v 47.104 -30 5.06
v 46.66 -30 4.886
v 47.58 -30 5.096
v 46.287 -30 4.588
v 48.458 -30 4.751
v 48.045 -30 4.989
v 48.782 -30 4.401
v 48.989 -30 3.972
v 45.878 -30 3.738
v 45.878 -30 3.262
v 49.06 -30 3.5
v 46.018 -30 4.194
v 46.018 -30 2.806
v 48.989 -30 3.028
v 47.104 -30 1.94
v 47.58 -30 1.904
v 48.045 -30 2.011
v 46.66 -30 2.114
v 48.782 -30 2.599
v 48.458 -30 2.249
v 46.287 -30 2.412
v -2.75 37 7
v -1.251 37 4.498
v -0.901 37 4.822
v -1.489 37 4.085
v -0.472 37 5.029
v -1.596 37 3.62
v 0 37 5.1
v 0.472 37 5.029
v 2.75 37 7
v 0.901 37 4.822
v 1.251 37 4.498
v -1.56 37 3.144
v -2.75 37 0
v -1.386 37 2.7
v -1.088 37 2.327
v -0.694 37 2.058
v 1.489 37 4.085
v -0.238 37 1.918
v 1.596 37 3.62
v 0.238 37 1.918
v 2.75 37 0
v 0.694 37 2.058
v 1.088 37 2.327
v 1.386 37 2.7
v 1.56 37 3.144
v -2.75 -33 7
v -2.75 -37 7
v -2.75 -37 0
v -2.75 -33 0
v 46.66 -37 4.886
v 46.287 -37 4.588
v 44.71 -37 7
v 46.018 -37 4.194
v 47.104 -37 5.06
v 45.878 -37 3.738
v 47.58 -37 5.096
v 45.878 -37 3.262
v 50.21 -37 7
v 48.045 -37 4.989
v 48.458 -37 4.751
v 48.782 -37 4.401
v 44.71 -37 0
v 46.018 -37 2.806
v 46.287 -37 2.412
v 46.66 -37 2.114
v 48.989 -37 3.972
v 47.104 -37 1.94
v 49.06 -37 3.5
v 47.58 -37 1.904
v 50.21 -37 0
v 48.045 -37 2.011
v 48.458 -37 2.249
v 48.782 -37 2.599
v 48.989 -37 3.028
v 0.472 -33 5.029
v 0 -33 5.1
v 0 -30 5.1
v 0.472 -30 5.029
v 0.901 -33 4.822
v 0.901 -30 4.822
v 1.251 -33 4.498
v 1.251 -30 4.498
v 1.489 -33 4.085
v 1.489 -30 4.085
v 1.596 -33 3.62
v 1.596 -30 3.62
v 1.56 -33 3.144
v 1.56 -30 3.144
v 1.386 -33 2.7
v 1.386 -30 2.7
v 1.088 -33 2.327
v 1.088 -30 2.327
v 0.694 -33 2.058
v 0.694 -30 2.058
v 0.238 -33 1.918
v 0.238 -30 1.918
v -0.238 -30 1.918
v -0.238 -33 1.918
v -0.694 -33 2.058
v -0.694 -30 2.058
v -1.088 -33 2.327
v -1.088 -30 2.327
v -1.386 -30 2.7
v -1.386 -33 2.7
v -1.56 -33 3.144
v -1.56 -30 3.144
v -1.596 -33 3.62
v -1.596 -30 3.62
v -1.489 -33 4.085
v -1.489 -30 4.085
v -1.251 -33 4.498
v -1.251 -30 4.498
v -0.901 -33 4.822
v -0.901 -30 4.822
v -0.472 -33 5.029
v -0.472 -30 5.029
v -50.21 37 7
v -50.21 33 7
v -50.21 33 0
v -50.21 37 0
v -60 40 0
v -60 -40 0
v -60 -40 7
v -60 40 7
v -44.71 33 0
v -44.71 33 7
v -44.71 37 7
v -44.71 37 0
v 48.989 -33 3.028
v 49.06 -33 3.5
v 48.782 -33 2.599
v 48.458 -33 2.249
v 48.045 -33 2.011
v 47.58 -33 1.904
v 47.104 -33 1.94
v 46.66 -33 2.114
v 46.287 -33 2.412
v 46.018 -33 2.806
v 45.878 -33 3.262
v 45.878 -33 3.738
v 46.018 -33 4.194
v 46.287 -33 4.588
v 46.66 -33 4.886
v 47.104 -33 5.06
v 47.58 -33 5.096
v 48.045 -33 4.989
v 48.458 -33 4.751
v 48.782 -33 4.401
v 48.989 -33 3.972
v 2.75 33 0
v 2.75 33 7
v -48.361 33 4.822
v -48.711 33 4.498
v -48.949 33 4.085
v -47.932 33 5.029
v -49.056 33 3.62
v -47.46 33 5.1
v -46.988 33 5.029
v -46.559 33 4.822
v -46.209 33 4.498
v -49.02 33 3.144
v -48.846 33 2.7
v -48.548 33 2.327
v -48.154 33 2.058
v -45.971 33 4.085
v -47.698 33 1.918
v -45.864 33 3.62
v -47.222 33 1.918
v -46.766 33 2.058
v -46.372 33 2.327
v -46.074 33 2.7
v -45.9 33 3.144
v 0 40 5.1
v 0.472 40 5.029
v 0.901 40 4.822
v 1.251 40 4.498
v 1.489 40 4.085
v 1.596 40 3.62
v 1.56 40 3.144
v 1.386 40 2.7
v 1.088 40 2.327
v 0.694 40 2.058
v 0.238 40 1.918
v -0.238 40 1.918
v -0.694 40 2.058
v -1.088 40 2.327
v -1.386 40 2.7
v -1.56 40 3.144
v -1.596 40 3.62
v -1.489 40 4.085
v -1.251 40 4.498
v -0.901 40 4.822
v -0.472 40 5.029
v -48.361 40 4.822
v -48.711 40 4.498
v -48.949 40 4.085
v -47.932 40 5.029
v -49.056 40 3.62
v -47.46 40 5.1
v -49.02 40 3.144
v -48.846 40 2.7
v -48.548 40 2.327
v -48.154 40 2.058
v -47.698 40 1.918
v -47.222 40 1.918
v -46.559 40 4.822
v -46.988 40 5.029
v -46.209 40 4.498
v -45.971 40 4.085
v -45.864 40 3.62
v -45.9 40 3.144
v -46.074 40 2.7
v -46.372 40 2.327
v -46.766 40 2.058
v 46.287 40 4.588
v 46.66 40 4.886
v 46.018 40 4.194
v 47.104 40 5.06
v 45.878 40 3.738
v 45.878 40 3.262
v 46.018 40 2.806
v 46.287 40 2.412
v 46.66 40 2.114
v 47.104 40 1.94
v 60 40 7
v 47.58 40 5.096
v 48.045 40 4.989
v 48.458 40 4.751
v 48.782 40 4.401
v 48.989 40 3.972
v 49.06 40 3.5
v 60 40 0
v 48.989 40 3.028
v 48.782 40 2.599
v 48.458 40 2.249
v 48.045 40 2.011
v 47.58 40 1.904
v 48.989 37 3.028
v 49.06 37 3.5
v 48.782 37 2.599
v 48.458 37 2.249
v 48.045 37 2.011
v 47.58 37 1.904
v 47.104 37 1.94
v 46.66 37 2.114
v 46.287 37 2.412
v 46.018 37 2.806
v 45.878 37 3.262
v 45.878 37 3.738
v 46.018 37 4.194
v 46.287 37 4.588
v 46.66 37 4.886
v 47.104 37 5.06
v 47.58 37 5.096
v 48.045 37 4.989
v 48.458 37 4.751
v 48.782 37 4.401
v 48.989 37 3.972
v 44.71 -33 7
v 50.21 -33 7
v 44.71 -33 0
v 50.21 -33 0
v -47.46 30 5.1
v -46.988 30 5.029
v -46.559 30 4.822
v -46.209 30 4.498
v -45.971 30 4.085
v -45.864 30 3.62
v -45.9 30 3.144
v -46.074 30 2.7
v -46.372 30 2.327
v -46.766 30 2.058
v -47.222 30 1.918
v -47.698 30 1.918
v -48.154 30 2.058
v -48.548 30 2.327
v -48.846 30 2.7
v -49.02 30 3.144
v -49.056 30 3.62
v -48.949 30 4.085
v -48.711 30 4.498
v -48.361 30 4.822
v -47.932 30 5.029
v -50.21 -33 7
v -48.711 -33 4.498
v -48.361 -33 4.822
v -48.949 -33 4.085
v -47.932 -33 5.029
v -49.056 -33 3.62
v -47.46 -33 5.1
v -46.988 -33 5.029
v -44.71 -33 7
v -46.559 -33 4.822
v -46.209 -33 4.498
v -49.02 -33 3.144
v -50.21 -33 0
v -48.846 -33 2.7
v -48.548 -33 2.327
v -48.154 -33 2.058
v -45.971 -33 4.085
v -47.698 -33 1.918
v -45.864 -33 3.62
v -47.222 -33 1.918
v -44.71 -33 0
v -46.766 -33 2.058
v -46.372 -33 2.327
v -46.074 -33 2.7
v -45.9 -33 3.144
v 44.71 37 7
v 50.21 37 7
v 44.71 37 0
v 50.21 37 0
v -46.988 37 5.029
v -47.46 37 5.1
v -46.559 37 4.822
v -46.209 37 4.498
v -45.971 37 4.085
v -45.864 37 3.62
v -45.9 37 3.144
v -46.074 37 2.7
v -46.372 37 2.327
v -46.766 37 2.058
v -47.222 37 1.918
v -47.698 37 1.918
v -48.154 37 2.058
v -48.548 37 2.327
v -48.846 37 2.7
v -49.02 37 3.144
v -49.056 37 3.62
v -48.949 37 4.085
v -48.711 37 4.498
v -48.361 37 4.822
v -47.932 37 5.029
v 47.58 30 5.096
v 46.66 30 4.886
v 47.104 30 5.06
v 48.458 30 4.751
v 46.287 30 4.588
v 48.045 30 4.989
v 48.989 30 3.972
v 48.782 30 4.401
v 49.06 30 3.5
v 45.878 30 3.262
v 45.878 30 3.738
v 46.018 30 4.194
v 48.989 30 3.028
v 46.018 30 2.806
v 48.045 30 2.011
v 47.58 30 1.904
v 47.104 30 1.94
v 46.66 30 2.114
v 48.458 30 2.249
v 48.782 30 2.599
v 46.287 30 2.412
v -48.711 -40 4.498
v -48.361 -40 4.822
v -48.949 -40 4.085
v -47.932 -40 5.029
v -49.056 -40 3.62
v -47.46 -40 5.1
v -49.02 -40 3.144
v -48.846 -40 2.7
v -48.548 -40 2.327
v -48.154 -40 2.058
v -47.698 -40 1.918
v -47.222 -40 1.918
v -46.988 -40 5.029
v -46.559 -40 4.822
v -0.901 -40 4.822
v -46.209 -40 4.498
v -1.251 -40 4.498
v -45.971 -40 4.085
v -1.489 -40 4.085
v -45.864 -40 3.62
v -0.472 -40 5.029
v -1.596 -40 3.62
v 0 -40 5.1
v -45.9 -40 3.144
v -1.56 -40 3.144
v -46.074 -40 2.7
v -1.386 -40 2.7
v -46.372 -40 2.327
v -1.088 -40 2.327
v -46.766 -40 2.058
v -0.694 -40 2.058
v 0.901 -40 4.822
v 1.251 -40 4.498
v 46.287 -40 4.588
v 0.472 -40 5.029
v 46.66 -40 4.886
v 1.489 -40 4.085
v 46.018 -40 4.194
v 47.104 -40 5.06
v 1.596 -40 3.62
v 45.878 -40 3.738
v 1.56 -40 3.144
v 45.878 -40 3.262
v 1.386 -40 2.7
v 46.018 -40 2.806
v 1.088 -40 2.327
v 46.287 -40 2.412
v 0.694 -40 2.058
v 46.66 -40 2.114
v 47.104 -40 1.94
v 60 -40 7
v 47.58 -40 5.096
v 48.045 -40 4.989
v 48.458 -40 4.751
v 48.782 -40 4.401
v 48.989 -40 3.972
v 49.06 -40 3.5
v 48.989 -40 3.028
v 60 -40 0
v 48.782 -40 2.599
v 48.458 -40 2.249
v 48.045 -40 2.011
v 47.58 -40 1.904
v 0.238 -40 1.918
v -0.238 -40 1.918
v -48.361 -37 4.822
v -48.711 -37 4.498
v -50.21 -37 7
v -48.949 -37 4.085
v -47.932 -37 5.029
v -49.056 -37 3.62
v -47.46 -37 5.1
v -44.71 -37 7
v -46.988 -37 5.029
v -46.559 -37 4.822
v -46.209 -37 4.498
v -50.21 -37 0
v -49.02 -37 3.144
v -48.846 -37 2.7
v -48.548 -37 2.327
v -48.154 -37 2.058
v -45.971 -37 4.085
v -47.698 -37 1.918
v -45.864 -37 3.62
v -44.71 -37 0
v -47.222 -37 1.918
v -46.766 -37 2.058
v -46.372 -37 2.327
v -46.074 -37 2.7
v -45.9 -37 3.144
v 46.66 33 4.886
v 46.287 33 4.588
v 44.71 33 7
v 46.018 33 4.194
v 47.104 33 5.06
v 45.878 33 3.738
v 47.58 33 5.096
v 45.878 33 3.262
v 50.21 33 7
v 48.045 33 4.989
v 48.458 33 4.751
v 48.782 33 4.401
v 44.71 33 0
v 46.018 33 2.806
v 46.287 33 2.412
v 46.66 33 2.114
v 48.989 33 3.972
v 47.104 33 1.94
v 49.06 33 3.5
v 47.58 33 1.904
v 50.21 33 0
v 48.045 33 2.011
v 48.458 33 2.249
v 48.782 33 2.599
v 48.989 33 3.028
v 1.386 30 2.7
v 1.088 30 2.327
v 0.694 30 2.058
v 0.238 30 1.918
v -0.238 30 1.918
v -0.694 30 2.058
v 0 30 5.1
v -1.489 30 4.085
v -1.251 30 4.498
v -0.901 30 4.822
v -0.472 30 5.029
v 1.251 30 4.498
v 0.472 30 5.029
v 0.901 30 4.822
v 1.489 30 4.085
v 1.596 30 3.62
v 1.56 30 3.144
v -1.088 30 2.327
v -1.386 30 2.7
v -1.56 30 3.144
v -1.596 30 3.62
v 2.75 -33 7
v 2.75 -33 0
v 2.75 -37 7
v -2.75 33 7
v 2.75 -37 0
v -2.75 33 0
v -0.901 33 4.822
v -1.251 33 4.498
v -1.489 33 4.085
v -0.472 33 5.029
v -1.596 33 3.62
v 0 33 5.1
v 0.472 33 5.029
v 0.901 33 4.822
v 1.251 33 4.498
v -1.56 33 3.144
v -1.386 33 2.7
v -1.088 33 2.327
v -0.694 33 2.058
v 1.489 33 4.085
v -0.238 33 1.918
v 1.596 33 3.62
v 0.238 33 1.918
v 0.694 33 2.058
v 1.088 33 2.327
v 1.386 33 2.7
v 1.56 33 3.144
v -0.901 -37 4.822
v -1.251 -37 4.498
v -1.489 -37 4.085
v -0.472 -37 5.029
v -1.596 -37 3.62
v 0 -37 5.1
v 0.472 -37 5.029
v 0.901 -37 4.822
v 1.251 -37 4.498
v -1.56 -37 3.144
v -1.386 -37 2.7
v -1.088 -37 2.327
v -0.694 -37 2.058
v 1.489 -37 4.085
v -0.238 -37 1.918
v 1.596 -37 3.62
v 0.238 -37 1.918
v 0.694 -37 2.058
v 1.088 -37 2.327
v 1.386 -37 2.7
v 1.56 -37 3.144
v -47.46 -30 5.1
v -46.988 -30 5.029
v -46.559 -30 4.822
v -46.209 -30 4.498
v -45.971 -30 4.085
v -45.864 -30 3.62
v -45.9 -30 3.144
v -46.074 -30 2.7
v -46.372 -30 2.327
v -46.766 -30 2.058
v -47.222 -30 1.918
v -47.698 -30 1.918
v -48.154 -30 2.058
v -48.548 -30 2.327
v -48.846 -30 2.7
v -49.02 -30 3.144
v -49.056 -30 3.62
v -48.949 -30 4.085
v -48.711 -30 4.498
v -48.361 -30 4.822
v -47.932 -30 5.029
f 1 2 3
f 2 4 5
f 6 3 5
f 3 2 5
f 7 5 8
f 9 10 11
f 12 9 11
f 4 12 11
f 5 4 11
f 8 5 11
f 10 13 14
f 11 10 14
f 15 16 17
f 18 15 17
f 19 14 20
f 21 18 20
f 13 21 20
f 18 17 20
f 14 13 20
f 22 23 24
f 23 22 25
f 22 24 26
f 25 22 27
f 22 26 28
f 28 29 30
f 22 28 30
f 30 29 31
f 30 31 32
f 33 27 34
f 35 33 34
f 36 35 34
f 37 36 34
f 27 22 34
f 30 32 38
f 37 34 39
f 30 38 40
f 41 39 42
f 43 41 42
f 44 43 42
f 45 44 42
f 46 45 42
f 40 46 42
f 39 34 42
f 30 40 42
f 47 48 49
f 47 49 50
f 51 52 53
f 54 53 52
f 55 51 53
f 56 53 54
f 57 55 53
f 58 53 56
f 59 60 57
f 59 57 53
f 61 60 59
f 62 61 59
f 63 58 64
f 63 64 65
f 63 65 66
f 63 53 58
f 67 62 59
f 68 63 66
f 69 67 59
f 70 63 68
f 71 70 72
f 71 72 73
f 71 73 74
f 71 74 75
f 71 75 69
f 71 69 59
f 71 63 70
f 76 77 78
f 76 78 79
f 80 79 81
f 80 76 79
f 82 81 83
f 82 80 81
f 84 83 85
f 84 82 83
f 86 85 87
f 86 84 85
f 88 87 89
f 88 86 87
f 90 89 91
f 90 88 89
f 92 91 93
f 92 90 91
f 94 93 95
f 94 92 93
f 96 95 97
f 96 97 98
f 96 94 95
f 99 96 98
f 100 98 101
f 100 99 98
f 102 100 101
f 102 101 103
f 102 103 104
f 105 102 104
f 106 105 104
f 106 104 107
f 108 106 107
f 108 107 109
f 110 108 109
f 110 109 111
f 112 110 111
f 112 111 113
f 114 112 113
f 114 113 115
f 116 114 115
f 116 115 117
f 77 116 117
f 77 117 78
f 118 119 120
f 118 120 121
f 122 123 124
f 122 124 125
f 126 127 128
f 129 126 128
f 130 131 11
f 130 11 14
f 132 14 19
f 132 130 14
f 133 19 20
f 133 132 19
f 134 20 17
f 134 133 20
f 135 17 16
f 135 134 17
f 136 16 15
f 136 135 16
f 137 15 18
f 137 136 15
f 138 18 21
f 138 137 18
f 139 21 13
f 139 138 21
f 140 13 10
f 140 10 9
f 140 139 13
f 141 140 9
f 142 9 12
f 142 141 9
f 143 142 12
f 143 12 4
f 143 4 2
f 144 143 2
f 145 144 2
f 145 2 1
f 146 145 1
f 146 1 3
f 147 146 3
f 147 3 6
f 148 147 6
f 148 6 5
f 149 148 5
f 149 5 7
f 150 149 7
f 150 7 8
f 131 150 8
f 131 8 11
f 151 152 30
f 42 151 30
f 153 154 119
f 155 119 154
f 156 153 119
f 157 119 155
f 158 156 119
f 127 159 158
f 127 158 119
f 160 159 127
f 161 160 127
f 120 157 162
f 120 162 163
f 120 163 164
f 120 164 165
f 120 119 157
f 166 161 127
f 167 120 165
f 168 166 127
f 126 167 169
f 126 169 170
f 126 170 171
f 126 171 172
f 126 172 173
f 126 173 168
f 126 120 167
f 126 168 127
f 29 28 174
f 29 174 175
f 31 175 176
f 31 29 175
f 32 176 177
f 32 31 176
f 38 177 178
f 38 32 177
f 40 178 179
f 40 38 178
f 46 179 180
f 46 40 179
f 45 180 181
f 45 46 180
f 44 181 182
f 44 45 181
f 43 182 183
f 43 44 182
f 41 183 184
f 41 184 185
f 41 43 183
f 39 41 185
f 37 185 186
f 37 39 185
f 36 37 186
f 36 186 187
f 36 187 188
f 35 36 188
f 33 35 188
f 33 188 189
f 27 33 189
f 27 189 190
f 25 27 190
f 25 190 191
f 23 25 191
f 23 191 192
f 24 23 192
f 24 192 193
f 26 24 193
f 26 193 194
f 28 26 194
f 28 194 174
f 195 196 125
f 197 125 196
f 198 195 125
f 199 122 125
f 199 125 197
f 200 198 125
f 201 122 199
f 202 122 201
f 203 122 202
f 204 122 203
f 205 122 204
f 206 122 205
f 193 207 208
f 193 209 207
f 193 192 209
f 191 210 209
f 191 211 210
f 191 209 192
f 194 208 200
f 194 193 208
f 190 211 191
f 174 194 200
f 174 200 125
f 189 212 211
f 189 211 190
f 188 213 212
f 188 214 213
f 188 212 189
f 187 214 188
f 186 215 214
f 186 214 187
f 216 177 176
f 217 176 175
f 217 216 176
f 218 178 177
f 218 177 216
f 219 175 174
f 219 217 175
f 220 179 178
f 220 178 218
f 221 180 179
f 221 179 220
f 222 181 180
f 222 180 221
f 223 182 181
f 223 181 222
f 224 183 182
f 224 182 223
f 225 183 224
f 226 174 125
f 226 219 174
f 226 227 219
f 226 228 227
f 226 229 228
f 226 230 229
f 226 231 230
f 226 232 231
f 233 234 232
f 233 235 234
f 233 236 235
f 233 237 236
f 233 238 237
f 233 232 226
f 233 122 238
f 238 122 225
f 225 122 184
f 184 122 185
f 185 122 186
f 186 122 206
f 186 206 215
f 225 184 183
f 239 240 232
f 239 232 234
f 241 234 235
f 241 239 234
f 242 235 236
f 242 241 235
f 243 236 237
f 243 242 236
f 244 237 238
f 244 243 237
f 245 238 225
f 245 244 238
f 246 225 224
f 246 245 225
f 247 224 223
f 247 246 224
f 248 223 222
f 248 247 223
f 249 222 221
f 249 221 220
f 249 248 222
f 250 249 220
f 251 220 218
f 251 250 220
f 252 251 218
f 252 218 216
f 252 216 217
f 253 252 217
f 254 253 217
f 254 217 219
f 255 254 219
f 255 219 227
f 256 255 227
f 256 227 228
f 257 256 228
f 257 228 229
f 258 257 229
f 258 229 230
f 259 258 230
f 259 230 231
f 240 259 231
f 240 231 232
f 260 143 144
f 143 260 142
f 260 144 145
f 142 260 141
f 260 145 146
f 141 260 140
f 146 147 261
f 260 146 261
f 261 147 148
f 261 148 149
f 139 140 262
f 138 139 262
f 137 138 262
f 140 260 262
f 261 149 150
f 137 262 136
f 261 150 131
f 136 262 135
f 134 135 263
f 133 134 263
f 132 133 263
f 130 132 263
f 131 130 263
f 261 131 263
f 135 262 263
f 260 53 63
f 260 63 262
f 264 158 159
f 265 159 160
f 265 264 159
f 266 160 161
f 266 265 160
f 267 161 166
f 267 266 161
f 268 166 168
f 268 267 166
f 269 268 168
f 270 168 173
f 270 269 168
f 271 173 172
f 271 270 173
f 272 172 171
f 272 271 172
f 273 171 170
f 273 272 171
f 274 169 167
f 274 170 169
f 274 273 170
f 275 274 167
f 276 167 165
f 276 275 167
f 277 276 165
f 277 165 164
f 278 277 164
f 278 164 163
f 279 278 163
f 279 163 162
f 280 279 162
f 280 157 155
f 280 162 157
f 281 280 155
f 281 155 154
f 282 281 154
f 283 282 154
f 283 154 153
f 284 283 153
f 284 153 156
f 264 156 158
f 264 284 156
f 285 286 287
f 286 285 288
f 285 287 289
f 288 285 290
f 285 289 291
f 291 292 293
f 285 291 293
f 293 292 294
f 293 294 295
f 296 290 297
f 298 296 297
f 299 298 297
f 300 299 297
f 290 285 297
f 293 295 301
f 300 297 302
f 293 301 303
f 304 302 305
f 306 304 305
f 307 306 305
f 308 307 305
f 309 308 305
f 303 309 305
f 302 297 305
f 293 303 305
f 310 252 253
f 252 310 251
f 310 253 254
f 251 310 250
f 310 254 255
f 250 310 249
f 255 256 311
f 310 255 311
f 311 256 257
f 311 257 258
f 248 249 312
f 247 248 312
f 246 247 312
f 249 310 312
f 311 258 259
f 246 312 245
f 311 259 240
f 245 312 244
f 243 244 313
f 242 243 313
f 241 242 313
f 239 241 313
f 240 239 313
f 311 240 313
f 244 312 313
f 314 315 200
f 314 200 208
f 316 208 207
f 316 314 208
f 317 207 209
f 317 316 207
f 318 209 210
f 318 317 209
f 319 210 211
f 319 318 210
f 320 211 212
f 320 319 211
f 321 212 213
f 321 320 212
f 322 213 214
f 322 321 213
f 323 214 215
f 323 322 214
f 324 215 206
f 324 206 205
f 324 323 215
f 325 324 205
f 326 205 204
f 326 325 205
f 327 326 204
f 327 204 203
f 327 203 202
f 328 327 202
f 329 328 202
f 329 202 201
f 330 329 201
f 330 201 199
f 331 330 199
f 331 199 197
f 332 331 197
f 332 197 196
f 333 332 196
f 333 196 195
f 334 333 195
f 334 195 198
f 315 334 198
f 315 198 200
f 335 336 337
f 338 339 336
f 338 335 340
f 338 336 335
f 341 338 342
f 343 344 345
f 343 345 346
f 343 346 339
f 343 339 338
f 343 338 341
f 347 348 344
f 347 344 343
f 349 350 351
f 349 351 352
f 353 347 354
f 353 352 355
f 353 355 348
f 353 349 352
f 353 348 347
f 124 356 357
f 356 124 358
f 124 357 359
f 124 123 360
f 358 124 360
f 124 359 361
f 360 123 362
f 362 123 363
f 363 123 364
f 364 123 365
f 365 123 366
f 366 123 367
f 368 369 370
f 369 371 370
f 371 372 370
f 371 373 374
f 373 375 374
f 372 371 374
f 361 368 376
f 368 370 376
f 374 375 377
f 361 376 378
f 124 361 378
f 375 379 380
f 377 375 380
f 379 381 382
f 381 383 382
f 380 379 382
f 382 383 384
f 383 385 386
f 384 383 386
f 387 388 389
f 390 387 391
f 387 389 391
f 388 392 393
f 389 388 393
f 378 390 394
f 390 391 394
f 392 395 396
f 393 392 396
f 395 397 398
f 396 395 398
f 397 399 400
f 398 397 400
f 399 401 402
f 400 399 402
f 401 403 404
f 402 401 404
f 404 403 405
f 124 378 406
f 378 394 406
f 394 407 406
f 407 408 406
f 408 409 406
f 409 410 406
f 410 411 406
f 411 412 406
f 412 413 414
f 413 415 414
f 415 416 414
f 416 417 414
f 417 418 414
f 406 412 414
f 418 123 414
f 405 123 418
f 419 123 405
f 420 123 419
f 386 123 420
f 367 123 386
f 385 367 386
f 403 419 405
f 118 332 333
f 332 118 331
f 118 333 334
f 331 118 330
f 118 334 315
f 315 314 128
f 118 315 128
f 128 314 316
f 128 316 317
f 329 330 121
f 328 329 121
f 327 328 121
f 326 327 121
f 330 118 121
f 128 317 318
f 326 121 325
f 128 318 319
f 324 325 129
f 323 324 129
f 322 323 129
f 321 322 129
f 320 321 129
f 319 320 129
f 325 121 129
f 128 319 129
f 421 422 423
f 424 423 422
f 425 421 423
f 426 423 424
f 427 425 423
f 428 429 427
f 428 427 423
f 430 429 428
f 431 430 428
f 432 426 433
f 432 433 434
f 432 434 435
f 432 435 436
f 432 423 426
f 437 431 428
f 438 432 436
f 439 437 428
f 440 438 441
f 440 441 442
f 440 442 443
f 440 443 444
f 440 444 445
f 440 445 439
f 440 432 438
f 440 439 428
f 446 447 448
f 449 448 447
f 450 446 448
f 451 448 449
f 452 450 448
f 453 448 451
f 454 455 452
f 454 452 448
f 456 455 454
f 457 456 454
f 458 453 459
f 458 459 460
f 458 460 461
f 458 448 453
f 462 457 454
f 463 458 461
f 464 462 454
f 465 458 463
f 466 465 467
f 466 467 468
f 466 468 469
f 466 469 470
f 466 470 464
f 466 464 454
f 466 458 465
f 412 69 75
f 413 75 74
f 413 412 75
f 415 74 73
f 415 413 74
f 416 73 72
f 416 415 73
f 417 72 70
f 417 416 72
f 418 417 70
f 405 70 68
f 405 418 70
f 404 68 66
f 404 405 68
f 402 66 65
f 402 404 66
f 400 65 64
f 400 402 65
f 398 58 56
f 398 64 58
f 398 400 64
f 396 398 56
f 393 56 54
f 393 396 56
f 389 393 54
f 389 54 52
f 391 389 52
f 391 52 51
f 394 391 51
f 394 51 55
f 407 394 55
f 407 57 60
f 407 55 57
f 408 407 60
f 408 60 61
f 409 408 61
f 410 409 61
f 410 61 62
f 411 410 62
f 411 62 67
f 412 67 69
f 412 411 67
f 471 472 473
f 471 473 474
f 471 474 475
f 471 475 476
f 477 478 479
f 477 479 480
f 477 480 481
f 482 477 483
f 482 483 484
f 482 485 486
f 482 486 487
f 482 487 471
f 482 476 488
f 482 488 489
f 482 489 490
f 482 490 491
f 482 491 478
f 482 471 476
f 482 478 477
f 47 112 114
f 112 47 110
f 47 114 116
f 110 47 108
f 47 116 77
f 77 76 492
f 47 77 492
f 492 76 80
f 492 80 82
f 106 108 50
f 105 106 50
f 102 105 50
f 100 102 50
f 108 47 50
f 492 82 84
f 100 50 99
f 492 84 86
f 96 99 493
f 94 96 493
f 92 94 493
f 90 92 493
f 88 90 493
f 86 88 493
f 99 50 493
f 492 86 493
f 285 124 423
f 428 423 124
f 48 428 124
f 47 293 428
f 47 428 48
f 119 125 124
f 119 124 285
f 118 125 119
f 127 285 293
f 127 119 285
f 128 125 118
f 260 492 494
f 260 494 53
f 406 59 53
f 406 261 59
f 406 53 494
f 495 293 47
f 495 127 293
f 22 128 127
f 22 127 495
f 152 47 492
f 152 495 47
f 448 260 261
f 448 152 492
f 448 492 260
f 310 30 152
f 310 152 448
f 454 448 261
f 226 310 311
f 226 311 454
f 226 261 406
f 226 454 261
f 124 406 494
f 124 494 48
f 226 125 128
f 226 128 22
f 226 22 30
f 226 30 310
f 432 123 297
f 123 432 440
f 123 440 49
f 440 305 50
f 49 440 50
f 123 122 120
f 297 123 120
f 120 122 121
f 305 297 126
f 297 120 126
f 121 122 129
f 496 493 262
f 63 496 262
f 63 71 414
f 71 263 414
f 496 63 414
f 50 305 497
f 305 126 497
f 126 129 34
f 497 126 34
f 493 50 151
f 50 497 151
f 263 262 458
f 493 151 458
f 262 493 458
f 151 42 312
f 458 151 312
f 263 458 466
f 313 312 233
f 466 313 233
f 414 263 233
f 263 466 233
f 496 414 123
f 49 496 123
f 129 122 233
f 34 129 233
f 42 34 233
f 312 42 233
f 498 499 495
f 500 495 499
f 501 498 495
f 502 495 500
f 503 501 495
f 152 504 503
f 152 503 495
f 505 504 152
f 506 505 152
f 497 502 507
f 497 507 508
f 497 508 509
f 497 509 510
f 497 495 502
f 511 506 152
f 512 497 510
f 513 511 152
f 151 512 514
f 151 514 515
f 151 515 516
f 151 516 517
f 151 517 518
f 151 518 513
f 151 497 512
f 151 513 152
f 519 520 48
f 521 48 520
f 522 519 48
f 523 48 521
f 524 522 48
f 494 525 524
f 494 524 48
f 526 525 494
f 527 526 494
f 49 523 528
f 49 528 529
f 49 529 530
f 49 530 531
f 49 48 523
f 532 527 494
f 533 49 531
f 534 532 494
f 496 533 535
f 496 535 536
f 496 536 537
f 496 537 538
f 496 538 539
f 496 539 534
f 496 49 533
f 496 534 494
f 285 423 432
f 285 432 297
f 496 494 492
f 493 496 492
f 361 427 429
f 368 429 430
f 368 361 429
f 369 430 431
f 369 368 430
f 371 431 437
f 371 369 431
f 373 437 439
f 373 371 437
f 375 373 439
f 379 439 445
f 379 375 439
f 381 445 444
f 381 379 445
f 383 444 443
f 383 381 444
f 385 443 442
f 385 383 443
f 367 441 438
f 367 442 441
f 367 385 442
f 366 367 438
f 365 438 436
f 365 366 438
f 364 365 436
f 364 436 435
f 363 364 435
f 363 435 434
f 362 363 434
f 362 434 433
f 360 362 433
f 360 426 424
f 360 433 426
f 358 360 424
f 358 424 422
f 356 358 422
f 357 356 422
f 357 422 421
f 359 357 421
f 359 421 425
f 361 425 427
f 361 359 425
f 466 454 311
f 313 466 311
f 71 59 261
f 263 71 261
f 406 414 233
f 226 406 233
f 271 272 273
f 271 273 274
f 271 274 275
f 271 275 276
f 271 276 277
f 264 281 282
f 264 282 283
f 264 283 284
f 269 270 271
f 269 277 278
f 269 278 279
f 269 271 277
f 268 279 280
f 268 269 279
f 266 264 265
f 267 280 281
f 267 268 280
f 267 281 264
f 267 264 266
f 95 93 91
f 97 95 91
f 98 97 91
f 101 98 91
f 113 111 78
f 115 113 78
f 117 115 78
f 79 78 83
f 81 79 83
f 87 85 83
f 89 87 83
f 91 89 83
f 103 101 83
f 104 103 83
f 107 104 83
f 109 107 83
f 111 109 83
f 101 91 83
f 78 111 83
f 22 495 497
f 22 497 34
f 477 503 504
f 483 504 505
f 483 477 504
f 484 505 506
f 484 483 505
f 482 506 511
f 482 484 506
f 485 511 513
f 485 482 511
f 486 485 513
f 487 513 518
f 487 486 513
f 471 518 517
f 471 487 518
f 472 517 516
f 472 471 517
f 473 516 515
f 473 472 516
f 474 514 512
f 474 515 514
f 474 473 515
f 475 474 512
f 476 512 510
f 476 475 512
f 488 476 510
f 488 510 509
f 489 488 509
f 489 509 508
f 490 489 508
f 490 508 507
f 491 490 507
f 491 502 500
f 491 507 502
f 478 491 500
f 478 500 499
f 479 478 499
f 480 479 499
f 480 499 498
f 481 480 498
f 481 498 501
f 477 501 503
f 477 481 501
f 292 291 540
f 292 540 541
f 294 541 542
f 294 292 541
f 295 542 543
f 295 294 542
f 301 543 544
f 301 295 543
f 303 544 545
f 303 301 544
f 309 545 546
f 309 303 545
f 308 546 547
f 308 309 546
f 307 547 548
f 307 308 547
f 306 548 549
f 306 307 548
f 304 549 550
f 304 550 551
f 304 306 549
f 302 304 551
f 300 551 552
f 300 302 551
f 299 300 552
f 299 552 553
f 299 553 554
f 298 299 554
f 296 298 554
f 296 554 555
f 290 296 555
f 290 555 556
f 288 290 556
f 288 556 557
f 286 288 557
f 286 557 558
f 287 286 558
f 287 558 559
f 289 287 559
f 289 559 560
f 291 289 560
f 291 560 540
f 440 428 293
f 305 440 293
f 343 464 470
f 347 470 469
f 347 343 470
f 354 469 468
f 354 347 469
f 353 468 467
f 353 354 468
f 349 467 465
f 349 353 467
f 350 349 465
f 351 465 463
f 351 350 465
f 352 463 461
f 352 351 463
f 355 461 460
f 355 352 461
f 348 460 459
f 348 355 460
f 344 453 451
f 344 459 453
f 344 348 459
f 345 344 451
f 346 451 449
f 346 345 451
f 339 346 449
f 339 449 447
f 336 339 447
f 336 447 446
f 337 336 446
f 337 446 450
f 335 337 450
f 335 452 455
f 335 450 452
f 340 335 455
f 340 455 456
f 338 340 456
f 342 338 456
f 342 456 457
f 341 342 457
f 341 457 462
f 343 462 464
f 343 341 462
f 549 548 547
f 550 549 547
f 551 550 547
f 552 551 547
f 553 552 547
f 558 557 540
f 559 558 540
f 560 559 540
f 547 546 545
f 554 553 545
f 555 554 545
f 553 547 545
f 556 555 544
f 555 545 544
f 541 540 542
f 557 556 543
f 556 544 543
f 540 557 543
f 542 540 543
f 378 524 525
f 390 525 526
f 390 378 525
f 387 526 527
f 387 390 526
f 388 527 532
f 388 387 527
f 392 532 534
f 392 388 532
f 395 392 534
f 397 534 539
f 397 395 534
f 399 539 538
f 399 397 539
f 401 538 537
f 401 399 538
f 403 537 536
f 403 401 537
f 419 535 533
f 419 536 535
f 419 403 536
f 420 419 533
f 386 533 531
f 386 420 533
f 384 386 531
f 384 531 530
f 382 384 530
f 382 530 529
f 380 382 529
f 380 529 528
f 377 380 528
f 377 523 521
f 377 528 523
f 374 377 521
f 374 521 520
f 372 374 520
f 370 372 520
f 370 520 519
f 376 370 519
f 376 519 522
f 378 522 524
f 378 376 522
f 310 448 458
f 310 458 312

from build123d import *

# Parameters (mm, degrees)
ESBO_O1_W                = 120
ESBO_O1_H                = 80
ESBO_O1_W_2              = 5.5
ESBO_O1_H_2              = 4
RESSALTO_EXTRUS_O4_DEPTH = 7
CORTE_EXTRUS_O1_START    = -80
ESBO_O2_R                = 1.6
CORTE_EXTRUS_O1_DEPTH    = 10
CORTE_EXTRUS_O2_START    = -10
ESBO_O2_2_R              = 1.6
CORTE_EXTRUS_O2_DEPTH    = 10


with BuildPart() as part:
    # Esboço1 → Ressalto-extrusão4 (new body)
    with BuildSketch(Plane.XY):
        Rectangle(ESBO_O1_W, ESBO_O1_H)
        with Locations((-47.46, -35)):
            Rectangle(ESBO_O1_W_2, ESBO_O1_H_2, mode=Mode.SUBTRACT)
        with Locations((47.46, -35)):
            Rectangle(ESBO_O1_W_2, ESBO_O1_H_2, mode=Mode.SUBTRACT)
        with Locations((0, -35)):
            Rectangle(ESBO_O1_W_2, ESBO_O1_H_2, mode=Mode.SUBTRACT)
        with Locations((47.46, 35)):
            Rectangle(ESBO_O1_W_2, ESBO_O1_H_2, mode=Mode.SUBTRACT)
        with Locations((0, 35)):
            Rectangle(ESBO_O1_W_2, ESBO_O1_H_2, mode=Mode.SUBTRACT)
        with Locations((-47.46, 35)):
            Rectangle(ESBO_O1_W_2, ESBO_O1_H_2, mode=Mode.SUBTRACT)
    extrude(amount=RESSALTO_EXTRUS_O4_DEPTH)

    # Esboço2 → Corte-extrusão1 (cut)
    with BuildSketch(Plane(origin=(0, 40, 0), x_dir=(1, 0, 0), z_dir=(0, 1, 0)).offset(CORTE_EXTRUS_O1_START)):
        with Locations(Location((-47.46, -3.5, 0), (0, 0, 270))):
            Circle(ESBO_O2_R)
        with Locations(Location((0, -3.5, 0), (0, 0, 270))):
            Circle(ESBO_O2_R)
        with Locations((47.46, -3.5)):
            Circle(ESBO_O2_R)
    extrude(amount=CORTE_EXTRUS_O1_DEPTH, mode=Mode.SUBTRACT)

    # Esboço2<2> → Corte-extrusão2 (cut)
    with BuildSketch(Plane(origin=(0, 40, 0), x_dir=(1, 0, 0), z_dir=(0, 1, 0)).offset(CORTE_EXTRUS_O2_START)):
        with Locations(Location((-47.46, -3.5, 0), (0, 0, 270))):
            Circle(ESBO_O2_2_R)
        with Locations(Location((0, -3.5, 0), (0, 0, 270))):
            Circle(ESBO_O2_2_R)
        with Locations((47.46, -3.5)):
            Circle(ESBO_O2_2_R)
    extrude(amount=CORTE_EXTRUS_O2_DEPTH, mode=Mode.SUBTRACT)


solid = part.part
